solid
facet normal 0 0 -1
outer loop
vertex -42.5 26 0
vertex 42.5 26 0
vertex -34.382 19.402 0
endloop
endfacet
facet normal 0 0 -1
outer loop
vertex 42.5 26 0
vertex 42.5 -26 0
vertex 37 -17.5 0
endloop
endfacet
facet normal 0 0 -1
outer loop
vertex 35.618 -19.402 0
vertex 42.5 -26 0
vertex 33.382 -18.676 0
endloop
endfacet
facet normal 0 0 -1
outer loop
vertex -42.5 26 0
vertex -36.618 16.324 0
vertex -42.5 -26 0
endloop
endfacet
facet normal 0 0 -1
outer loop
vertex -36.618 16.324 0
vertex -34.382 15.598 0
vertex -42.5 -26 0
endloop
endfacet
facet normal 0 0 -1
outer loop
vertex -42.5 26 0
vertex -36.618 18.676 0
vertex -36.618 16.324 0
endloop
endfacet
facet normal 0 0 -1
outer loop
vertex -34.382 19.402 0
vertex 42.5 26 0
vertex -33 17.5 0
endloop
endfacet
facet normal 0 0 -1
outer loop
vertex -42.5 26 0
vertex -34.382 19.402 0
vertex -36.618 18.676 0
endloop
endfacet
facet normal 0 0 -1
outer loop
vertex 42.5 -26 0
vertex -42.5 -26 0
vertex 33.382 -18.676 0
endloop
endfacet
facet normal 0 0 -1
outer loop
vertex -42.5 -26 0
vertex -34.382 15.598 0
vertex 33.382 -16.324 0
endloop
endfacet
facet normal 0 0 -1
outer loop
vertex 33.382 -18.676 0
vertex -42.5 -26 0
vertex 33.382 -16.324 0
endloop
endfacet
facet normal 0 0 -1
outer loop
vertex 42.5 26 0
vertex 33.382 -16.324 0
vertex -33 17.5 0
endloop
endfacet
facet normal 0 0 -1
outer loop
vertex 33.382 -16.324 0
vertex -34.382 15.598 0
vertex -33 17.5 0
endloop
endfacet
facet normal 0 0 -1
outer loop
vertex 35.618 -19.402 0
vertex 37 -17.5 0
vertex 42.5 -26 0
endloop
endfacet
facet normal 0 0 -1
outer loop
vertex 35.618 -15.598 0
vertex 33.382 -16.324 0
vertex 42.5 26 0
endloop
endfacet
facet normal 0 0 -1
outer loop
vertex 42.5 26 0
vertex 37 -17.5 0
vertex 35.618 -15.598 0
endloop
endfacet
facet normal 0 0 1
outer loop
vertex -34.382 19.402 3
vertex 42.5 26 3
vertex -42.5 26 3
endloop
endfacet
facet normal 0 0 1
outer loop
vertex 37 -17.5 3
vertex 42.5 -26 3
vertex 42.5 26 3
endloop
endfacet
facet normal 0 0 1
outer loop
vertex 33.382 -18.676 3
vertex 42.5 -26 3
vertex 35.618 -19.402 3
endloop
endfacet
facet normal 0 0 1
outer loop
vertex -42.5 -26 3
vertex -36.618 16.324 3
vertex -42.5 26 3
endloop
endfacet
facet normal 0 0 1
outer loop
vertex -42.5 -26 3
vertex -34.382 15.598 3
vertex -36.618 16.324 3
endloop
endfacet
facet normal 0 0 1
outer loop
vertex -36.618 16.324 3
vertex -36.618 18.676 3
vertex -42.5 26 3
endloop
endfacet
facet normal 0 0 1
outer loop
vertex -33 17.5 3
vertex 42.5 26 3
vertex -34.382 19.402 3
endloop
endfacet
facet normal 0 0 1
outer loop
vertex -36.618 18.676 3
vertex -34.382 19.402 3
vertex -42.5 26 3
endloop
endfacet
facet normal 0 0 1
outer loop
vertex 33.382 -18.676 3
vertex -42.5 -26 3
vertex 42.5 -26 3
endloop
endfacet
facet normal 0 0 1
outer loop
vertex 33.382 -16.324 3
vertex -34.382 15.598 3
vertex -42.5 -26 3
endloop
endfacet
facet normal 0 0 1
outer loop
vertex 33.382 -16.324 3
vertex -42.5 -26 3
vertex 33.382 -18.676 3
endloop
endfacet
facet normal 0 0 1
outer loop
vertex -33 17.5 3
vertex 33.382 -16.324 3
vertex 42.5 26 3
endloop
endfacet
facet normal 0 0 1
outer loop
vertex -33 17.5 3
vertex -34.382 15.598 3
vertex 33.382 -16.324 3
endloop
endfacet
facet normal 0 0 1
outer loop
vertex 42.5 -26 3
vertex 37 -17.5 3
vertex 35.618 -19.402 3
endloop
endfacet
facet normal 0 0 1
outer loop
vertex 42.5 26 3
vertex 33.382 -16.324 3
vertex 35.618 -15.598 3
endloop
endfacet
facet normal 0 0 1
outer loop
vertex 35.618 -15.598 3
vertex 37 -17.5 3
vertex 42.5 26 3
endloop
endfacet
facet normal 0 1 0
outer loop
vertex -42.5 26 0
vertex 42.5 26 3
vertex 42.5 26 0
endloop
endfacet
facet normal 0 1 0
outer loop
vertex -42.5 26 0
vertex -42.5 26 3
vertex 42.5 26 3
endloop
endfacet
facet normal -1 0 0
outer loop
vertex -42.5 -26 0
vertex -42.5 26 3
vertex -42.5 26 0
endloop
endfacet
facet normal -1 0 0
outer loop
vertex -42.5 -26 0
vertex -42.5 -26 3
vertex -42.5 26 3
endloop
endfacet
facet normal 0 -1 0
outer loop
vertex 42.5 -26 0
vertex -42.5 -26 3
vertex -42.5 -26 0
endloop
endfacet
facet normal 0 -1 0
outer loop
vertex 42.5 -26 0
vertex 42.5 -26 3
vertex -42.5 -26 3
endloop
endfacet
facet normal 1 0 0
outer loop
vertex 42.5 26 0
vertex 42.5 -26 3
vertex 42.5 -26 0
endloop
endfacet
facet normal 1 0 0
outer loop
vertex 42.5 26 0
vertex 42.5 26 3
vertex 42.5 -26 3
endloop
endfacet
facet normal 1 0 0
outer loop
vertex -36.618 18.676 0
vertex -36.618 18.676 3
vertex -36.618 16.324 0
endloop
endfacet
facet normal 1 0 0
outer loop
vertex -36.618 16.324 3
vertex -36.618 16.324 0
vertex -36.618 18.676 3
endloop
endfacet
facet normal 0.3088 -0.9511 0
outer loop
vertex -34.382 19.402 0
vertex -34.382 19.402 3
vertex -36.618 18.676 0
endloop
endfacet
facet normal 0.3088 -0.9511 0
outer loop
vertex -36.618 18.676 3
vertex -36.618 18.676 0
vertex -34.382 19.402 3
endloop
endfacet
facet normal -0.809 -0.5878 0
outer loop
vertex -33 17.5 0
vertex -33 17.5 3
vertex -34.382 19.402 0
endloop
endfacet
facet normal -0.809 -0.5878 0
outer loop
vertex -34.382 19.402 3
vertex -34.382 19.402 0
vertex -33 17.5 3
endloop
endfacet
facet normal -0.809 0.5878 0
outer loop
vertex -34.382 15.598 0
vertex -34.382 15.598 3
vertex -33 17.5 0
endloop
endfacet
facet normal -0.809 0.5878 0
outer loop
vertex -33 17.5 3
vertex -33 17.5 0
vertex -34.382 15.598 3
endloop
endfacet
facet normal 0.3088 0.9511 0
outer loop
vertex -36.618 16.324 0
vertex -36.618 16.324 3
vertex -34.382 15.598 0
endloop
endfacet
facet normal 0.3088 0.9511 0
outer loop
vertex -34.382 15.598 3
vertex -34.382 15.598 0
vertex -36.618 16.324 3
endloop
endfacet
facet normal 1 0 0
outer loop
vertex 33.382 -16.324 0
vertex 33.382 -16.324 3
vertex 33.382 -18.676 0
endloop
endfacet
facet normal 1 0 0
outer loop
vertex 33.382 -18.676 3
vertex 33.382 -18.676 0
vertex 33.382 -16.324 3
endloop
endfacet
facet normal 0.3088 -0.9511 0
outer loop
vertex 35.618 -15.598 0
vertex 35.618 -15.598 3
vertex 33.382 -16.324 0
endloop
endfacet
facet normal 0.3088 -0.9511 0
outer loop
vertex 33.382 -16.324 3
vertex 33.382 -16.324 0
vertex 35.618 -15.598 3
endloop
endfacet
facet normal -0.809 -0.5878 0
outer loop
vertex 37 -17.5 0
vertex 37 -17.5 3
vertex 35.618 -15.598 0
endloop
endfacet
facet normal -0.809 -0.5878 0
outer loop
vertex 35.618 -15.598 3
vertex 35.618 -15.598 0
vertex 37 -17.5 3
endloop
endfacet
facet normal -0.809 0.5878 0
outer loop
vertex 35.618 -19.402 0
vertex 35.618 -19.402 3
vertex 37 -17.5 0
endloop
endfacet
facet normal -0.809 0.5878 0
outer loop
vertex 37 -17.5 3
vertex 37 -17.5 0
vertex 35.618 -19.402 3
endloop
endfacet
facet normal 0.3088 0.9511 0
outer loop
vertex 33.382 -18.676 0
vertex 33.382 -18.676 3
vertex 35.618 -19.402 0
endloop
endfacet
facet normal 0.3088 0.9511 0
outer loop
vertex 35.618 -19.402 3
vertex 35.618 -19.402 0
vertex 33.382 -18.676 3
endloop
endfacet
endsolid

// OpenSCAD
linear_extrude(3) {
  difference() {
    square([85, 52], center = true);

    x = 70 / 2;
    y = 35 / 2;

    for (p = [[x, -y], [-x, y]]) {
      translate(p) {
        circle(d = 4, $fn = 5);
      }
    }
  }
}
